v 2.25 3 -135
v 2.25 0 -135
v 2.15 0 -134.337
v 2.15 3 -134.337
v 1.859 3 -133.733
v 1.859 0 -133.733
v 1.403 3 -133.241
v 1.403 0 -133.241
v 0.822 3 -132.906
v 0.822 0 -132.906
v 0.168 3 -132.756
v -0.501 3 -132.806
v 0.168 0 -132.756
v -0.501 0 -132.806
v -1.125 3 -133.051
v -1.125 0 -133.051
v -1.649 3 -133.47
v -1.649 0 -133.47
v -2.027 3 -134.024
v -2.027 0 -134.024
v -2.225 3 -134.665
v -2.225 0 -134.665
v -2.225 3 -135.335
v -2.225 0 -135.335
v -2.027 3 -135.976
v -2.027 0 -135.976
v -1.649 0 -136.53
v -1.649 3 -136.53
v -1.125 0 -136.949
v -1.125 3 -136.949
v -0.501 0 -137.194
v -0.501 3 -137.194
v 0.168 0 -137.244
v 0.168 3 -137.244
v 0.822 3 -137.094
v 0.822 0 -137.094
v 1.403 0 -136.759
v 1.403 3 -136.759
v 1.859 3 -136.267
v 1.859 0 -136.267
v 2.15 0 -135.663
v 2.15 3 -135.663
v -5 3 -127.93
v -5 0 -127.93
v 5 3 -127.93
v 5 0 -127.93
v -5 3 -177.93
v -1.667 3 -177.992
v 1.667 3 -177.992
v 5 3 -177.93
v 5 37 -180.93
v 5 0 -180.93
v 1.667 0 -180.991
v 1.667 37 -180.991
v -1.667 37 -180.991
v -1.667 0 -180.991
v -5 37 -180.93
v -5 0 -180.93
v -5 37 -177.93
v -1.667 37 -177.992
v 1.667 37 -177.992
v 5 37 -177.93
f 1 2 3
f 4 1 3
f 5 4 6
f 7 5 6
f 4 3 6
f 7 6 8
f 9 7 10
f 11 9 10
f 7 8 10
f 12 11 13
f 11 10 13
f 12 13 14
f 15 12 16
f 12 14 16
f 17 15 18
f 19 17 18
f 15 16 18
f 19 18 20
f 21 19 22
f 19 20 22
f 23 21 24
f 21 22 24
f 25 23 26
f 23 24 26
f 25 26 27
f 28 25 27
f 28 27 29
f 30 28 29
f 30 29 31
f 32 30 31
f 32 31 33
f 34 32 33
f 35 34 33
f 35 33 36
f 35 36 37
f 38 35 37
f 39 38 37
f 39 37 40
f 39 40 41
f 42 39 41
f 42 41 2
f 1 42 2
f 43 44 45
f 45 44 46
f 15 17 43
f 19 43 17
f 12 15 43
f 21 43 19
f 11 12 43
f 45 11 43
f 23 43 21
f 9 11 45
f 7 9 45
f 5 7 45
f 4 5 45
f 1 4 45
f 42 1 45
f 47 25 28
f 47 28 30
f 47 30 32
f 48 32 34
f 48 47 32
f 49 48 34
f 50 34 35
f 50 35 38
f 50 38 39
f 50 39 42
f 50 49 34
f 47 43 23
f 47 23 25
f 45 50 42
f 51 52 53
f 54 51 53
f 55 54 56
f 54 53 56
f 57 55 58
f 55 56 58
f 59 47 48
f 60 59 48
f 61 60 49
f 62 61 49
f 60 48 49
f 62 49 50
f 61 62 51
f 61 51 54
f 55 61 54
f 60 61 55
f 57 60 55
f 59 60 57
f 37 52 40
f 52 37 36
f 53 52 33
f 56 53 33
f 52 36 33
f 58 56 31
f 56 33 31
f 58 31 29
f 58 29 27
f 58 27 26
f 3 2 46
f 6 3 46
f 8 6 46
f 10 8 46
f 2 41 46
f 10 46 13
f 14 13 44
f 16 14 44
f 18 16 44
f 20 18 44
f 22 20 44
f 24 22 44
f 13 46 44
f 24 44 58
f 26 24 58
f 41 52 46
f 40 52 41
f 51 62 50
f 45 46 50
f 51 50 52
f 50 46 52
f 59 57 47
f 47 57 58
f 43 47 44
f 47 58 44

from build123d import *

# Parameters (mm, degrees)
BOSS_EXTRUDE1_DEPTH = 3
BOSS_EXTRUDE2_DEPTH = 37
CUT_EXTRUDE1_REACH  = 39
SKETCH3_R           = 2.25


with BuildPart() as part:
    # Sketch1 → Boss-Extrude1 (new body)
    with BuildSketch(Plane(origin=(0, 0, 0), x_dir=(1, 0, 0), z_dir=(0, 1, 0))):
        with BuildLine():
            Line((-5, 177.929761423), (-5, 127.929761423))
            Line((-5, 127.929761423), (5, 127.929761423))
            Line((5, 127.929761423), (5, 177.929761423))
            ThreePointArc((5, 177.929761423), (0, 178), (-5, 177.929761423))
        make_face()
    extrude(amount=BOSS_EXTRUDE1_DEPTH)

    # Sketch2 → Boss-Extrude2 (add)
    with BuildSketch(Plane.XZ):
        with BuildLine():
            Line((5, -177.929761423), (5, -180.929761423))
            ThreePointArc((5, -180.929761423), (0, -180.998835821), (-5, -180.929761423))
            Line((-5, -180.929761423), (-5, -177.929761423))
            ThreePointArc((-5, -177.929761423), (0, -178), (5, -177.929761423))
        make_face()
    extrude(amount=-BOSS_EXTRUDE2_DEPTH)

    # Sketch3 → Cut-Extrude1 (cut, up to next)
    with BuildSketch(Plane.XZ, mode=Mode.PRIVATE) as cut_extrude1_sk1:
        with Locations((0, -135)):
            Circle(SKETCH3_R)
    cut_extrude1_tool1 = extrude(cut_extrude1_sk1.sketch, amount=-CUT_EXTRUDE1_REACH, mode=Mode.PRIVATE) & part.part
    add(cut_extrude1_tool1.solids().sort_by_distance((0, 0, -135))[0], mode=Mode.SUBTRACT)


solid = part.part
